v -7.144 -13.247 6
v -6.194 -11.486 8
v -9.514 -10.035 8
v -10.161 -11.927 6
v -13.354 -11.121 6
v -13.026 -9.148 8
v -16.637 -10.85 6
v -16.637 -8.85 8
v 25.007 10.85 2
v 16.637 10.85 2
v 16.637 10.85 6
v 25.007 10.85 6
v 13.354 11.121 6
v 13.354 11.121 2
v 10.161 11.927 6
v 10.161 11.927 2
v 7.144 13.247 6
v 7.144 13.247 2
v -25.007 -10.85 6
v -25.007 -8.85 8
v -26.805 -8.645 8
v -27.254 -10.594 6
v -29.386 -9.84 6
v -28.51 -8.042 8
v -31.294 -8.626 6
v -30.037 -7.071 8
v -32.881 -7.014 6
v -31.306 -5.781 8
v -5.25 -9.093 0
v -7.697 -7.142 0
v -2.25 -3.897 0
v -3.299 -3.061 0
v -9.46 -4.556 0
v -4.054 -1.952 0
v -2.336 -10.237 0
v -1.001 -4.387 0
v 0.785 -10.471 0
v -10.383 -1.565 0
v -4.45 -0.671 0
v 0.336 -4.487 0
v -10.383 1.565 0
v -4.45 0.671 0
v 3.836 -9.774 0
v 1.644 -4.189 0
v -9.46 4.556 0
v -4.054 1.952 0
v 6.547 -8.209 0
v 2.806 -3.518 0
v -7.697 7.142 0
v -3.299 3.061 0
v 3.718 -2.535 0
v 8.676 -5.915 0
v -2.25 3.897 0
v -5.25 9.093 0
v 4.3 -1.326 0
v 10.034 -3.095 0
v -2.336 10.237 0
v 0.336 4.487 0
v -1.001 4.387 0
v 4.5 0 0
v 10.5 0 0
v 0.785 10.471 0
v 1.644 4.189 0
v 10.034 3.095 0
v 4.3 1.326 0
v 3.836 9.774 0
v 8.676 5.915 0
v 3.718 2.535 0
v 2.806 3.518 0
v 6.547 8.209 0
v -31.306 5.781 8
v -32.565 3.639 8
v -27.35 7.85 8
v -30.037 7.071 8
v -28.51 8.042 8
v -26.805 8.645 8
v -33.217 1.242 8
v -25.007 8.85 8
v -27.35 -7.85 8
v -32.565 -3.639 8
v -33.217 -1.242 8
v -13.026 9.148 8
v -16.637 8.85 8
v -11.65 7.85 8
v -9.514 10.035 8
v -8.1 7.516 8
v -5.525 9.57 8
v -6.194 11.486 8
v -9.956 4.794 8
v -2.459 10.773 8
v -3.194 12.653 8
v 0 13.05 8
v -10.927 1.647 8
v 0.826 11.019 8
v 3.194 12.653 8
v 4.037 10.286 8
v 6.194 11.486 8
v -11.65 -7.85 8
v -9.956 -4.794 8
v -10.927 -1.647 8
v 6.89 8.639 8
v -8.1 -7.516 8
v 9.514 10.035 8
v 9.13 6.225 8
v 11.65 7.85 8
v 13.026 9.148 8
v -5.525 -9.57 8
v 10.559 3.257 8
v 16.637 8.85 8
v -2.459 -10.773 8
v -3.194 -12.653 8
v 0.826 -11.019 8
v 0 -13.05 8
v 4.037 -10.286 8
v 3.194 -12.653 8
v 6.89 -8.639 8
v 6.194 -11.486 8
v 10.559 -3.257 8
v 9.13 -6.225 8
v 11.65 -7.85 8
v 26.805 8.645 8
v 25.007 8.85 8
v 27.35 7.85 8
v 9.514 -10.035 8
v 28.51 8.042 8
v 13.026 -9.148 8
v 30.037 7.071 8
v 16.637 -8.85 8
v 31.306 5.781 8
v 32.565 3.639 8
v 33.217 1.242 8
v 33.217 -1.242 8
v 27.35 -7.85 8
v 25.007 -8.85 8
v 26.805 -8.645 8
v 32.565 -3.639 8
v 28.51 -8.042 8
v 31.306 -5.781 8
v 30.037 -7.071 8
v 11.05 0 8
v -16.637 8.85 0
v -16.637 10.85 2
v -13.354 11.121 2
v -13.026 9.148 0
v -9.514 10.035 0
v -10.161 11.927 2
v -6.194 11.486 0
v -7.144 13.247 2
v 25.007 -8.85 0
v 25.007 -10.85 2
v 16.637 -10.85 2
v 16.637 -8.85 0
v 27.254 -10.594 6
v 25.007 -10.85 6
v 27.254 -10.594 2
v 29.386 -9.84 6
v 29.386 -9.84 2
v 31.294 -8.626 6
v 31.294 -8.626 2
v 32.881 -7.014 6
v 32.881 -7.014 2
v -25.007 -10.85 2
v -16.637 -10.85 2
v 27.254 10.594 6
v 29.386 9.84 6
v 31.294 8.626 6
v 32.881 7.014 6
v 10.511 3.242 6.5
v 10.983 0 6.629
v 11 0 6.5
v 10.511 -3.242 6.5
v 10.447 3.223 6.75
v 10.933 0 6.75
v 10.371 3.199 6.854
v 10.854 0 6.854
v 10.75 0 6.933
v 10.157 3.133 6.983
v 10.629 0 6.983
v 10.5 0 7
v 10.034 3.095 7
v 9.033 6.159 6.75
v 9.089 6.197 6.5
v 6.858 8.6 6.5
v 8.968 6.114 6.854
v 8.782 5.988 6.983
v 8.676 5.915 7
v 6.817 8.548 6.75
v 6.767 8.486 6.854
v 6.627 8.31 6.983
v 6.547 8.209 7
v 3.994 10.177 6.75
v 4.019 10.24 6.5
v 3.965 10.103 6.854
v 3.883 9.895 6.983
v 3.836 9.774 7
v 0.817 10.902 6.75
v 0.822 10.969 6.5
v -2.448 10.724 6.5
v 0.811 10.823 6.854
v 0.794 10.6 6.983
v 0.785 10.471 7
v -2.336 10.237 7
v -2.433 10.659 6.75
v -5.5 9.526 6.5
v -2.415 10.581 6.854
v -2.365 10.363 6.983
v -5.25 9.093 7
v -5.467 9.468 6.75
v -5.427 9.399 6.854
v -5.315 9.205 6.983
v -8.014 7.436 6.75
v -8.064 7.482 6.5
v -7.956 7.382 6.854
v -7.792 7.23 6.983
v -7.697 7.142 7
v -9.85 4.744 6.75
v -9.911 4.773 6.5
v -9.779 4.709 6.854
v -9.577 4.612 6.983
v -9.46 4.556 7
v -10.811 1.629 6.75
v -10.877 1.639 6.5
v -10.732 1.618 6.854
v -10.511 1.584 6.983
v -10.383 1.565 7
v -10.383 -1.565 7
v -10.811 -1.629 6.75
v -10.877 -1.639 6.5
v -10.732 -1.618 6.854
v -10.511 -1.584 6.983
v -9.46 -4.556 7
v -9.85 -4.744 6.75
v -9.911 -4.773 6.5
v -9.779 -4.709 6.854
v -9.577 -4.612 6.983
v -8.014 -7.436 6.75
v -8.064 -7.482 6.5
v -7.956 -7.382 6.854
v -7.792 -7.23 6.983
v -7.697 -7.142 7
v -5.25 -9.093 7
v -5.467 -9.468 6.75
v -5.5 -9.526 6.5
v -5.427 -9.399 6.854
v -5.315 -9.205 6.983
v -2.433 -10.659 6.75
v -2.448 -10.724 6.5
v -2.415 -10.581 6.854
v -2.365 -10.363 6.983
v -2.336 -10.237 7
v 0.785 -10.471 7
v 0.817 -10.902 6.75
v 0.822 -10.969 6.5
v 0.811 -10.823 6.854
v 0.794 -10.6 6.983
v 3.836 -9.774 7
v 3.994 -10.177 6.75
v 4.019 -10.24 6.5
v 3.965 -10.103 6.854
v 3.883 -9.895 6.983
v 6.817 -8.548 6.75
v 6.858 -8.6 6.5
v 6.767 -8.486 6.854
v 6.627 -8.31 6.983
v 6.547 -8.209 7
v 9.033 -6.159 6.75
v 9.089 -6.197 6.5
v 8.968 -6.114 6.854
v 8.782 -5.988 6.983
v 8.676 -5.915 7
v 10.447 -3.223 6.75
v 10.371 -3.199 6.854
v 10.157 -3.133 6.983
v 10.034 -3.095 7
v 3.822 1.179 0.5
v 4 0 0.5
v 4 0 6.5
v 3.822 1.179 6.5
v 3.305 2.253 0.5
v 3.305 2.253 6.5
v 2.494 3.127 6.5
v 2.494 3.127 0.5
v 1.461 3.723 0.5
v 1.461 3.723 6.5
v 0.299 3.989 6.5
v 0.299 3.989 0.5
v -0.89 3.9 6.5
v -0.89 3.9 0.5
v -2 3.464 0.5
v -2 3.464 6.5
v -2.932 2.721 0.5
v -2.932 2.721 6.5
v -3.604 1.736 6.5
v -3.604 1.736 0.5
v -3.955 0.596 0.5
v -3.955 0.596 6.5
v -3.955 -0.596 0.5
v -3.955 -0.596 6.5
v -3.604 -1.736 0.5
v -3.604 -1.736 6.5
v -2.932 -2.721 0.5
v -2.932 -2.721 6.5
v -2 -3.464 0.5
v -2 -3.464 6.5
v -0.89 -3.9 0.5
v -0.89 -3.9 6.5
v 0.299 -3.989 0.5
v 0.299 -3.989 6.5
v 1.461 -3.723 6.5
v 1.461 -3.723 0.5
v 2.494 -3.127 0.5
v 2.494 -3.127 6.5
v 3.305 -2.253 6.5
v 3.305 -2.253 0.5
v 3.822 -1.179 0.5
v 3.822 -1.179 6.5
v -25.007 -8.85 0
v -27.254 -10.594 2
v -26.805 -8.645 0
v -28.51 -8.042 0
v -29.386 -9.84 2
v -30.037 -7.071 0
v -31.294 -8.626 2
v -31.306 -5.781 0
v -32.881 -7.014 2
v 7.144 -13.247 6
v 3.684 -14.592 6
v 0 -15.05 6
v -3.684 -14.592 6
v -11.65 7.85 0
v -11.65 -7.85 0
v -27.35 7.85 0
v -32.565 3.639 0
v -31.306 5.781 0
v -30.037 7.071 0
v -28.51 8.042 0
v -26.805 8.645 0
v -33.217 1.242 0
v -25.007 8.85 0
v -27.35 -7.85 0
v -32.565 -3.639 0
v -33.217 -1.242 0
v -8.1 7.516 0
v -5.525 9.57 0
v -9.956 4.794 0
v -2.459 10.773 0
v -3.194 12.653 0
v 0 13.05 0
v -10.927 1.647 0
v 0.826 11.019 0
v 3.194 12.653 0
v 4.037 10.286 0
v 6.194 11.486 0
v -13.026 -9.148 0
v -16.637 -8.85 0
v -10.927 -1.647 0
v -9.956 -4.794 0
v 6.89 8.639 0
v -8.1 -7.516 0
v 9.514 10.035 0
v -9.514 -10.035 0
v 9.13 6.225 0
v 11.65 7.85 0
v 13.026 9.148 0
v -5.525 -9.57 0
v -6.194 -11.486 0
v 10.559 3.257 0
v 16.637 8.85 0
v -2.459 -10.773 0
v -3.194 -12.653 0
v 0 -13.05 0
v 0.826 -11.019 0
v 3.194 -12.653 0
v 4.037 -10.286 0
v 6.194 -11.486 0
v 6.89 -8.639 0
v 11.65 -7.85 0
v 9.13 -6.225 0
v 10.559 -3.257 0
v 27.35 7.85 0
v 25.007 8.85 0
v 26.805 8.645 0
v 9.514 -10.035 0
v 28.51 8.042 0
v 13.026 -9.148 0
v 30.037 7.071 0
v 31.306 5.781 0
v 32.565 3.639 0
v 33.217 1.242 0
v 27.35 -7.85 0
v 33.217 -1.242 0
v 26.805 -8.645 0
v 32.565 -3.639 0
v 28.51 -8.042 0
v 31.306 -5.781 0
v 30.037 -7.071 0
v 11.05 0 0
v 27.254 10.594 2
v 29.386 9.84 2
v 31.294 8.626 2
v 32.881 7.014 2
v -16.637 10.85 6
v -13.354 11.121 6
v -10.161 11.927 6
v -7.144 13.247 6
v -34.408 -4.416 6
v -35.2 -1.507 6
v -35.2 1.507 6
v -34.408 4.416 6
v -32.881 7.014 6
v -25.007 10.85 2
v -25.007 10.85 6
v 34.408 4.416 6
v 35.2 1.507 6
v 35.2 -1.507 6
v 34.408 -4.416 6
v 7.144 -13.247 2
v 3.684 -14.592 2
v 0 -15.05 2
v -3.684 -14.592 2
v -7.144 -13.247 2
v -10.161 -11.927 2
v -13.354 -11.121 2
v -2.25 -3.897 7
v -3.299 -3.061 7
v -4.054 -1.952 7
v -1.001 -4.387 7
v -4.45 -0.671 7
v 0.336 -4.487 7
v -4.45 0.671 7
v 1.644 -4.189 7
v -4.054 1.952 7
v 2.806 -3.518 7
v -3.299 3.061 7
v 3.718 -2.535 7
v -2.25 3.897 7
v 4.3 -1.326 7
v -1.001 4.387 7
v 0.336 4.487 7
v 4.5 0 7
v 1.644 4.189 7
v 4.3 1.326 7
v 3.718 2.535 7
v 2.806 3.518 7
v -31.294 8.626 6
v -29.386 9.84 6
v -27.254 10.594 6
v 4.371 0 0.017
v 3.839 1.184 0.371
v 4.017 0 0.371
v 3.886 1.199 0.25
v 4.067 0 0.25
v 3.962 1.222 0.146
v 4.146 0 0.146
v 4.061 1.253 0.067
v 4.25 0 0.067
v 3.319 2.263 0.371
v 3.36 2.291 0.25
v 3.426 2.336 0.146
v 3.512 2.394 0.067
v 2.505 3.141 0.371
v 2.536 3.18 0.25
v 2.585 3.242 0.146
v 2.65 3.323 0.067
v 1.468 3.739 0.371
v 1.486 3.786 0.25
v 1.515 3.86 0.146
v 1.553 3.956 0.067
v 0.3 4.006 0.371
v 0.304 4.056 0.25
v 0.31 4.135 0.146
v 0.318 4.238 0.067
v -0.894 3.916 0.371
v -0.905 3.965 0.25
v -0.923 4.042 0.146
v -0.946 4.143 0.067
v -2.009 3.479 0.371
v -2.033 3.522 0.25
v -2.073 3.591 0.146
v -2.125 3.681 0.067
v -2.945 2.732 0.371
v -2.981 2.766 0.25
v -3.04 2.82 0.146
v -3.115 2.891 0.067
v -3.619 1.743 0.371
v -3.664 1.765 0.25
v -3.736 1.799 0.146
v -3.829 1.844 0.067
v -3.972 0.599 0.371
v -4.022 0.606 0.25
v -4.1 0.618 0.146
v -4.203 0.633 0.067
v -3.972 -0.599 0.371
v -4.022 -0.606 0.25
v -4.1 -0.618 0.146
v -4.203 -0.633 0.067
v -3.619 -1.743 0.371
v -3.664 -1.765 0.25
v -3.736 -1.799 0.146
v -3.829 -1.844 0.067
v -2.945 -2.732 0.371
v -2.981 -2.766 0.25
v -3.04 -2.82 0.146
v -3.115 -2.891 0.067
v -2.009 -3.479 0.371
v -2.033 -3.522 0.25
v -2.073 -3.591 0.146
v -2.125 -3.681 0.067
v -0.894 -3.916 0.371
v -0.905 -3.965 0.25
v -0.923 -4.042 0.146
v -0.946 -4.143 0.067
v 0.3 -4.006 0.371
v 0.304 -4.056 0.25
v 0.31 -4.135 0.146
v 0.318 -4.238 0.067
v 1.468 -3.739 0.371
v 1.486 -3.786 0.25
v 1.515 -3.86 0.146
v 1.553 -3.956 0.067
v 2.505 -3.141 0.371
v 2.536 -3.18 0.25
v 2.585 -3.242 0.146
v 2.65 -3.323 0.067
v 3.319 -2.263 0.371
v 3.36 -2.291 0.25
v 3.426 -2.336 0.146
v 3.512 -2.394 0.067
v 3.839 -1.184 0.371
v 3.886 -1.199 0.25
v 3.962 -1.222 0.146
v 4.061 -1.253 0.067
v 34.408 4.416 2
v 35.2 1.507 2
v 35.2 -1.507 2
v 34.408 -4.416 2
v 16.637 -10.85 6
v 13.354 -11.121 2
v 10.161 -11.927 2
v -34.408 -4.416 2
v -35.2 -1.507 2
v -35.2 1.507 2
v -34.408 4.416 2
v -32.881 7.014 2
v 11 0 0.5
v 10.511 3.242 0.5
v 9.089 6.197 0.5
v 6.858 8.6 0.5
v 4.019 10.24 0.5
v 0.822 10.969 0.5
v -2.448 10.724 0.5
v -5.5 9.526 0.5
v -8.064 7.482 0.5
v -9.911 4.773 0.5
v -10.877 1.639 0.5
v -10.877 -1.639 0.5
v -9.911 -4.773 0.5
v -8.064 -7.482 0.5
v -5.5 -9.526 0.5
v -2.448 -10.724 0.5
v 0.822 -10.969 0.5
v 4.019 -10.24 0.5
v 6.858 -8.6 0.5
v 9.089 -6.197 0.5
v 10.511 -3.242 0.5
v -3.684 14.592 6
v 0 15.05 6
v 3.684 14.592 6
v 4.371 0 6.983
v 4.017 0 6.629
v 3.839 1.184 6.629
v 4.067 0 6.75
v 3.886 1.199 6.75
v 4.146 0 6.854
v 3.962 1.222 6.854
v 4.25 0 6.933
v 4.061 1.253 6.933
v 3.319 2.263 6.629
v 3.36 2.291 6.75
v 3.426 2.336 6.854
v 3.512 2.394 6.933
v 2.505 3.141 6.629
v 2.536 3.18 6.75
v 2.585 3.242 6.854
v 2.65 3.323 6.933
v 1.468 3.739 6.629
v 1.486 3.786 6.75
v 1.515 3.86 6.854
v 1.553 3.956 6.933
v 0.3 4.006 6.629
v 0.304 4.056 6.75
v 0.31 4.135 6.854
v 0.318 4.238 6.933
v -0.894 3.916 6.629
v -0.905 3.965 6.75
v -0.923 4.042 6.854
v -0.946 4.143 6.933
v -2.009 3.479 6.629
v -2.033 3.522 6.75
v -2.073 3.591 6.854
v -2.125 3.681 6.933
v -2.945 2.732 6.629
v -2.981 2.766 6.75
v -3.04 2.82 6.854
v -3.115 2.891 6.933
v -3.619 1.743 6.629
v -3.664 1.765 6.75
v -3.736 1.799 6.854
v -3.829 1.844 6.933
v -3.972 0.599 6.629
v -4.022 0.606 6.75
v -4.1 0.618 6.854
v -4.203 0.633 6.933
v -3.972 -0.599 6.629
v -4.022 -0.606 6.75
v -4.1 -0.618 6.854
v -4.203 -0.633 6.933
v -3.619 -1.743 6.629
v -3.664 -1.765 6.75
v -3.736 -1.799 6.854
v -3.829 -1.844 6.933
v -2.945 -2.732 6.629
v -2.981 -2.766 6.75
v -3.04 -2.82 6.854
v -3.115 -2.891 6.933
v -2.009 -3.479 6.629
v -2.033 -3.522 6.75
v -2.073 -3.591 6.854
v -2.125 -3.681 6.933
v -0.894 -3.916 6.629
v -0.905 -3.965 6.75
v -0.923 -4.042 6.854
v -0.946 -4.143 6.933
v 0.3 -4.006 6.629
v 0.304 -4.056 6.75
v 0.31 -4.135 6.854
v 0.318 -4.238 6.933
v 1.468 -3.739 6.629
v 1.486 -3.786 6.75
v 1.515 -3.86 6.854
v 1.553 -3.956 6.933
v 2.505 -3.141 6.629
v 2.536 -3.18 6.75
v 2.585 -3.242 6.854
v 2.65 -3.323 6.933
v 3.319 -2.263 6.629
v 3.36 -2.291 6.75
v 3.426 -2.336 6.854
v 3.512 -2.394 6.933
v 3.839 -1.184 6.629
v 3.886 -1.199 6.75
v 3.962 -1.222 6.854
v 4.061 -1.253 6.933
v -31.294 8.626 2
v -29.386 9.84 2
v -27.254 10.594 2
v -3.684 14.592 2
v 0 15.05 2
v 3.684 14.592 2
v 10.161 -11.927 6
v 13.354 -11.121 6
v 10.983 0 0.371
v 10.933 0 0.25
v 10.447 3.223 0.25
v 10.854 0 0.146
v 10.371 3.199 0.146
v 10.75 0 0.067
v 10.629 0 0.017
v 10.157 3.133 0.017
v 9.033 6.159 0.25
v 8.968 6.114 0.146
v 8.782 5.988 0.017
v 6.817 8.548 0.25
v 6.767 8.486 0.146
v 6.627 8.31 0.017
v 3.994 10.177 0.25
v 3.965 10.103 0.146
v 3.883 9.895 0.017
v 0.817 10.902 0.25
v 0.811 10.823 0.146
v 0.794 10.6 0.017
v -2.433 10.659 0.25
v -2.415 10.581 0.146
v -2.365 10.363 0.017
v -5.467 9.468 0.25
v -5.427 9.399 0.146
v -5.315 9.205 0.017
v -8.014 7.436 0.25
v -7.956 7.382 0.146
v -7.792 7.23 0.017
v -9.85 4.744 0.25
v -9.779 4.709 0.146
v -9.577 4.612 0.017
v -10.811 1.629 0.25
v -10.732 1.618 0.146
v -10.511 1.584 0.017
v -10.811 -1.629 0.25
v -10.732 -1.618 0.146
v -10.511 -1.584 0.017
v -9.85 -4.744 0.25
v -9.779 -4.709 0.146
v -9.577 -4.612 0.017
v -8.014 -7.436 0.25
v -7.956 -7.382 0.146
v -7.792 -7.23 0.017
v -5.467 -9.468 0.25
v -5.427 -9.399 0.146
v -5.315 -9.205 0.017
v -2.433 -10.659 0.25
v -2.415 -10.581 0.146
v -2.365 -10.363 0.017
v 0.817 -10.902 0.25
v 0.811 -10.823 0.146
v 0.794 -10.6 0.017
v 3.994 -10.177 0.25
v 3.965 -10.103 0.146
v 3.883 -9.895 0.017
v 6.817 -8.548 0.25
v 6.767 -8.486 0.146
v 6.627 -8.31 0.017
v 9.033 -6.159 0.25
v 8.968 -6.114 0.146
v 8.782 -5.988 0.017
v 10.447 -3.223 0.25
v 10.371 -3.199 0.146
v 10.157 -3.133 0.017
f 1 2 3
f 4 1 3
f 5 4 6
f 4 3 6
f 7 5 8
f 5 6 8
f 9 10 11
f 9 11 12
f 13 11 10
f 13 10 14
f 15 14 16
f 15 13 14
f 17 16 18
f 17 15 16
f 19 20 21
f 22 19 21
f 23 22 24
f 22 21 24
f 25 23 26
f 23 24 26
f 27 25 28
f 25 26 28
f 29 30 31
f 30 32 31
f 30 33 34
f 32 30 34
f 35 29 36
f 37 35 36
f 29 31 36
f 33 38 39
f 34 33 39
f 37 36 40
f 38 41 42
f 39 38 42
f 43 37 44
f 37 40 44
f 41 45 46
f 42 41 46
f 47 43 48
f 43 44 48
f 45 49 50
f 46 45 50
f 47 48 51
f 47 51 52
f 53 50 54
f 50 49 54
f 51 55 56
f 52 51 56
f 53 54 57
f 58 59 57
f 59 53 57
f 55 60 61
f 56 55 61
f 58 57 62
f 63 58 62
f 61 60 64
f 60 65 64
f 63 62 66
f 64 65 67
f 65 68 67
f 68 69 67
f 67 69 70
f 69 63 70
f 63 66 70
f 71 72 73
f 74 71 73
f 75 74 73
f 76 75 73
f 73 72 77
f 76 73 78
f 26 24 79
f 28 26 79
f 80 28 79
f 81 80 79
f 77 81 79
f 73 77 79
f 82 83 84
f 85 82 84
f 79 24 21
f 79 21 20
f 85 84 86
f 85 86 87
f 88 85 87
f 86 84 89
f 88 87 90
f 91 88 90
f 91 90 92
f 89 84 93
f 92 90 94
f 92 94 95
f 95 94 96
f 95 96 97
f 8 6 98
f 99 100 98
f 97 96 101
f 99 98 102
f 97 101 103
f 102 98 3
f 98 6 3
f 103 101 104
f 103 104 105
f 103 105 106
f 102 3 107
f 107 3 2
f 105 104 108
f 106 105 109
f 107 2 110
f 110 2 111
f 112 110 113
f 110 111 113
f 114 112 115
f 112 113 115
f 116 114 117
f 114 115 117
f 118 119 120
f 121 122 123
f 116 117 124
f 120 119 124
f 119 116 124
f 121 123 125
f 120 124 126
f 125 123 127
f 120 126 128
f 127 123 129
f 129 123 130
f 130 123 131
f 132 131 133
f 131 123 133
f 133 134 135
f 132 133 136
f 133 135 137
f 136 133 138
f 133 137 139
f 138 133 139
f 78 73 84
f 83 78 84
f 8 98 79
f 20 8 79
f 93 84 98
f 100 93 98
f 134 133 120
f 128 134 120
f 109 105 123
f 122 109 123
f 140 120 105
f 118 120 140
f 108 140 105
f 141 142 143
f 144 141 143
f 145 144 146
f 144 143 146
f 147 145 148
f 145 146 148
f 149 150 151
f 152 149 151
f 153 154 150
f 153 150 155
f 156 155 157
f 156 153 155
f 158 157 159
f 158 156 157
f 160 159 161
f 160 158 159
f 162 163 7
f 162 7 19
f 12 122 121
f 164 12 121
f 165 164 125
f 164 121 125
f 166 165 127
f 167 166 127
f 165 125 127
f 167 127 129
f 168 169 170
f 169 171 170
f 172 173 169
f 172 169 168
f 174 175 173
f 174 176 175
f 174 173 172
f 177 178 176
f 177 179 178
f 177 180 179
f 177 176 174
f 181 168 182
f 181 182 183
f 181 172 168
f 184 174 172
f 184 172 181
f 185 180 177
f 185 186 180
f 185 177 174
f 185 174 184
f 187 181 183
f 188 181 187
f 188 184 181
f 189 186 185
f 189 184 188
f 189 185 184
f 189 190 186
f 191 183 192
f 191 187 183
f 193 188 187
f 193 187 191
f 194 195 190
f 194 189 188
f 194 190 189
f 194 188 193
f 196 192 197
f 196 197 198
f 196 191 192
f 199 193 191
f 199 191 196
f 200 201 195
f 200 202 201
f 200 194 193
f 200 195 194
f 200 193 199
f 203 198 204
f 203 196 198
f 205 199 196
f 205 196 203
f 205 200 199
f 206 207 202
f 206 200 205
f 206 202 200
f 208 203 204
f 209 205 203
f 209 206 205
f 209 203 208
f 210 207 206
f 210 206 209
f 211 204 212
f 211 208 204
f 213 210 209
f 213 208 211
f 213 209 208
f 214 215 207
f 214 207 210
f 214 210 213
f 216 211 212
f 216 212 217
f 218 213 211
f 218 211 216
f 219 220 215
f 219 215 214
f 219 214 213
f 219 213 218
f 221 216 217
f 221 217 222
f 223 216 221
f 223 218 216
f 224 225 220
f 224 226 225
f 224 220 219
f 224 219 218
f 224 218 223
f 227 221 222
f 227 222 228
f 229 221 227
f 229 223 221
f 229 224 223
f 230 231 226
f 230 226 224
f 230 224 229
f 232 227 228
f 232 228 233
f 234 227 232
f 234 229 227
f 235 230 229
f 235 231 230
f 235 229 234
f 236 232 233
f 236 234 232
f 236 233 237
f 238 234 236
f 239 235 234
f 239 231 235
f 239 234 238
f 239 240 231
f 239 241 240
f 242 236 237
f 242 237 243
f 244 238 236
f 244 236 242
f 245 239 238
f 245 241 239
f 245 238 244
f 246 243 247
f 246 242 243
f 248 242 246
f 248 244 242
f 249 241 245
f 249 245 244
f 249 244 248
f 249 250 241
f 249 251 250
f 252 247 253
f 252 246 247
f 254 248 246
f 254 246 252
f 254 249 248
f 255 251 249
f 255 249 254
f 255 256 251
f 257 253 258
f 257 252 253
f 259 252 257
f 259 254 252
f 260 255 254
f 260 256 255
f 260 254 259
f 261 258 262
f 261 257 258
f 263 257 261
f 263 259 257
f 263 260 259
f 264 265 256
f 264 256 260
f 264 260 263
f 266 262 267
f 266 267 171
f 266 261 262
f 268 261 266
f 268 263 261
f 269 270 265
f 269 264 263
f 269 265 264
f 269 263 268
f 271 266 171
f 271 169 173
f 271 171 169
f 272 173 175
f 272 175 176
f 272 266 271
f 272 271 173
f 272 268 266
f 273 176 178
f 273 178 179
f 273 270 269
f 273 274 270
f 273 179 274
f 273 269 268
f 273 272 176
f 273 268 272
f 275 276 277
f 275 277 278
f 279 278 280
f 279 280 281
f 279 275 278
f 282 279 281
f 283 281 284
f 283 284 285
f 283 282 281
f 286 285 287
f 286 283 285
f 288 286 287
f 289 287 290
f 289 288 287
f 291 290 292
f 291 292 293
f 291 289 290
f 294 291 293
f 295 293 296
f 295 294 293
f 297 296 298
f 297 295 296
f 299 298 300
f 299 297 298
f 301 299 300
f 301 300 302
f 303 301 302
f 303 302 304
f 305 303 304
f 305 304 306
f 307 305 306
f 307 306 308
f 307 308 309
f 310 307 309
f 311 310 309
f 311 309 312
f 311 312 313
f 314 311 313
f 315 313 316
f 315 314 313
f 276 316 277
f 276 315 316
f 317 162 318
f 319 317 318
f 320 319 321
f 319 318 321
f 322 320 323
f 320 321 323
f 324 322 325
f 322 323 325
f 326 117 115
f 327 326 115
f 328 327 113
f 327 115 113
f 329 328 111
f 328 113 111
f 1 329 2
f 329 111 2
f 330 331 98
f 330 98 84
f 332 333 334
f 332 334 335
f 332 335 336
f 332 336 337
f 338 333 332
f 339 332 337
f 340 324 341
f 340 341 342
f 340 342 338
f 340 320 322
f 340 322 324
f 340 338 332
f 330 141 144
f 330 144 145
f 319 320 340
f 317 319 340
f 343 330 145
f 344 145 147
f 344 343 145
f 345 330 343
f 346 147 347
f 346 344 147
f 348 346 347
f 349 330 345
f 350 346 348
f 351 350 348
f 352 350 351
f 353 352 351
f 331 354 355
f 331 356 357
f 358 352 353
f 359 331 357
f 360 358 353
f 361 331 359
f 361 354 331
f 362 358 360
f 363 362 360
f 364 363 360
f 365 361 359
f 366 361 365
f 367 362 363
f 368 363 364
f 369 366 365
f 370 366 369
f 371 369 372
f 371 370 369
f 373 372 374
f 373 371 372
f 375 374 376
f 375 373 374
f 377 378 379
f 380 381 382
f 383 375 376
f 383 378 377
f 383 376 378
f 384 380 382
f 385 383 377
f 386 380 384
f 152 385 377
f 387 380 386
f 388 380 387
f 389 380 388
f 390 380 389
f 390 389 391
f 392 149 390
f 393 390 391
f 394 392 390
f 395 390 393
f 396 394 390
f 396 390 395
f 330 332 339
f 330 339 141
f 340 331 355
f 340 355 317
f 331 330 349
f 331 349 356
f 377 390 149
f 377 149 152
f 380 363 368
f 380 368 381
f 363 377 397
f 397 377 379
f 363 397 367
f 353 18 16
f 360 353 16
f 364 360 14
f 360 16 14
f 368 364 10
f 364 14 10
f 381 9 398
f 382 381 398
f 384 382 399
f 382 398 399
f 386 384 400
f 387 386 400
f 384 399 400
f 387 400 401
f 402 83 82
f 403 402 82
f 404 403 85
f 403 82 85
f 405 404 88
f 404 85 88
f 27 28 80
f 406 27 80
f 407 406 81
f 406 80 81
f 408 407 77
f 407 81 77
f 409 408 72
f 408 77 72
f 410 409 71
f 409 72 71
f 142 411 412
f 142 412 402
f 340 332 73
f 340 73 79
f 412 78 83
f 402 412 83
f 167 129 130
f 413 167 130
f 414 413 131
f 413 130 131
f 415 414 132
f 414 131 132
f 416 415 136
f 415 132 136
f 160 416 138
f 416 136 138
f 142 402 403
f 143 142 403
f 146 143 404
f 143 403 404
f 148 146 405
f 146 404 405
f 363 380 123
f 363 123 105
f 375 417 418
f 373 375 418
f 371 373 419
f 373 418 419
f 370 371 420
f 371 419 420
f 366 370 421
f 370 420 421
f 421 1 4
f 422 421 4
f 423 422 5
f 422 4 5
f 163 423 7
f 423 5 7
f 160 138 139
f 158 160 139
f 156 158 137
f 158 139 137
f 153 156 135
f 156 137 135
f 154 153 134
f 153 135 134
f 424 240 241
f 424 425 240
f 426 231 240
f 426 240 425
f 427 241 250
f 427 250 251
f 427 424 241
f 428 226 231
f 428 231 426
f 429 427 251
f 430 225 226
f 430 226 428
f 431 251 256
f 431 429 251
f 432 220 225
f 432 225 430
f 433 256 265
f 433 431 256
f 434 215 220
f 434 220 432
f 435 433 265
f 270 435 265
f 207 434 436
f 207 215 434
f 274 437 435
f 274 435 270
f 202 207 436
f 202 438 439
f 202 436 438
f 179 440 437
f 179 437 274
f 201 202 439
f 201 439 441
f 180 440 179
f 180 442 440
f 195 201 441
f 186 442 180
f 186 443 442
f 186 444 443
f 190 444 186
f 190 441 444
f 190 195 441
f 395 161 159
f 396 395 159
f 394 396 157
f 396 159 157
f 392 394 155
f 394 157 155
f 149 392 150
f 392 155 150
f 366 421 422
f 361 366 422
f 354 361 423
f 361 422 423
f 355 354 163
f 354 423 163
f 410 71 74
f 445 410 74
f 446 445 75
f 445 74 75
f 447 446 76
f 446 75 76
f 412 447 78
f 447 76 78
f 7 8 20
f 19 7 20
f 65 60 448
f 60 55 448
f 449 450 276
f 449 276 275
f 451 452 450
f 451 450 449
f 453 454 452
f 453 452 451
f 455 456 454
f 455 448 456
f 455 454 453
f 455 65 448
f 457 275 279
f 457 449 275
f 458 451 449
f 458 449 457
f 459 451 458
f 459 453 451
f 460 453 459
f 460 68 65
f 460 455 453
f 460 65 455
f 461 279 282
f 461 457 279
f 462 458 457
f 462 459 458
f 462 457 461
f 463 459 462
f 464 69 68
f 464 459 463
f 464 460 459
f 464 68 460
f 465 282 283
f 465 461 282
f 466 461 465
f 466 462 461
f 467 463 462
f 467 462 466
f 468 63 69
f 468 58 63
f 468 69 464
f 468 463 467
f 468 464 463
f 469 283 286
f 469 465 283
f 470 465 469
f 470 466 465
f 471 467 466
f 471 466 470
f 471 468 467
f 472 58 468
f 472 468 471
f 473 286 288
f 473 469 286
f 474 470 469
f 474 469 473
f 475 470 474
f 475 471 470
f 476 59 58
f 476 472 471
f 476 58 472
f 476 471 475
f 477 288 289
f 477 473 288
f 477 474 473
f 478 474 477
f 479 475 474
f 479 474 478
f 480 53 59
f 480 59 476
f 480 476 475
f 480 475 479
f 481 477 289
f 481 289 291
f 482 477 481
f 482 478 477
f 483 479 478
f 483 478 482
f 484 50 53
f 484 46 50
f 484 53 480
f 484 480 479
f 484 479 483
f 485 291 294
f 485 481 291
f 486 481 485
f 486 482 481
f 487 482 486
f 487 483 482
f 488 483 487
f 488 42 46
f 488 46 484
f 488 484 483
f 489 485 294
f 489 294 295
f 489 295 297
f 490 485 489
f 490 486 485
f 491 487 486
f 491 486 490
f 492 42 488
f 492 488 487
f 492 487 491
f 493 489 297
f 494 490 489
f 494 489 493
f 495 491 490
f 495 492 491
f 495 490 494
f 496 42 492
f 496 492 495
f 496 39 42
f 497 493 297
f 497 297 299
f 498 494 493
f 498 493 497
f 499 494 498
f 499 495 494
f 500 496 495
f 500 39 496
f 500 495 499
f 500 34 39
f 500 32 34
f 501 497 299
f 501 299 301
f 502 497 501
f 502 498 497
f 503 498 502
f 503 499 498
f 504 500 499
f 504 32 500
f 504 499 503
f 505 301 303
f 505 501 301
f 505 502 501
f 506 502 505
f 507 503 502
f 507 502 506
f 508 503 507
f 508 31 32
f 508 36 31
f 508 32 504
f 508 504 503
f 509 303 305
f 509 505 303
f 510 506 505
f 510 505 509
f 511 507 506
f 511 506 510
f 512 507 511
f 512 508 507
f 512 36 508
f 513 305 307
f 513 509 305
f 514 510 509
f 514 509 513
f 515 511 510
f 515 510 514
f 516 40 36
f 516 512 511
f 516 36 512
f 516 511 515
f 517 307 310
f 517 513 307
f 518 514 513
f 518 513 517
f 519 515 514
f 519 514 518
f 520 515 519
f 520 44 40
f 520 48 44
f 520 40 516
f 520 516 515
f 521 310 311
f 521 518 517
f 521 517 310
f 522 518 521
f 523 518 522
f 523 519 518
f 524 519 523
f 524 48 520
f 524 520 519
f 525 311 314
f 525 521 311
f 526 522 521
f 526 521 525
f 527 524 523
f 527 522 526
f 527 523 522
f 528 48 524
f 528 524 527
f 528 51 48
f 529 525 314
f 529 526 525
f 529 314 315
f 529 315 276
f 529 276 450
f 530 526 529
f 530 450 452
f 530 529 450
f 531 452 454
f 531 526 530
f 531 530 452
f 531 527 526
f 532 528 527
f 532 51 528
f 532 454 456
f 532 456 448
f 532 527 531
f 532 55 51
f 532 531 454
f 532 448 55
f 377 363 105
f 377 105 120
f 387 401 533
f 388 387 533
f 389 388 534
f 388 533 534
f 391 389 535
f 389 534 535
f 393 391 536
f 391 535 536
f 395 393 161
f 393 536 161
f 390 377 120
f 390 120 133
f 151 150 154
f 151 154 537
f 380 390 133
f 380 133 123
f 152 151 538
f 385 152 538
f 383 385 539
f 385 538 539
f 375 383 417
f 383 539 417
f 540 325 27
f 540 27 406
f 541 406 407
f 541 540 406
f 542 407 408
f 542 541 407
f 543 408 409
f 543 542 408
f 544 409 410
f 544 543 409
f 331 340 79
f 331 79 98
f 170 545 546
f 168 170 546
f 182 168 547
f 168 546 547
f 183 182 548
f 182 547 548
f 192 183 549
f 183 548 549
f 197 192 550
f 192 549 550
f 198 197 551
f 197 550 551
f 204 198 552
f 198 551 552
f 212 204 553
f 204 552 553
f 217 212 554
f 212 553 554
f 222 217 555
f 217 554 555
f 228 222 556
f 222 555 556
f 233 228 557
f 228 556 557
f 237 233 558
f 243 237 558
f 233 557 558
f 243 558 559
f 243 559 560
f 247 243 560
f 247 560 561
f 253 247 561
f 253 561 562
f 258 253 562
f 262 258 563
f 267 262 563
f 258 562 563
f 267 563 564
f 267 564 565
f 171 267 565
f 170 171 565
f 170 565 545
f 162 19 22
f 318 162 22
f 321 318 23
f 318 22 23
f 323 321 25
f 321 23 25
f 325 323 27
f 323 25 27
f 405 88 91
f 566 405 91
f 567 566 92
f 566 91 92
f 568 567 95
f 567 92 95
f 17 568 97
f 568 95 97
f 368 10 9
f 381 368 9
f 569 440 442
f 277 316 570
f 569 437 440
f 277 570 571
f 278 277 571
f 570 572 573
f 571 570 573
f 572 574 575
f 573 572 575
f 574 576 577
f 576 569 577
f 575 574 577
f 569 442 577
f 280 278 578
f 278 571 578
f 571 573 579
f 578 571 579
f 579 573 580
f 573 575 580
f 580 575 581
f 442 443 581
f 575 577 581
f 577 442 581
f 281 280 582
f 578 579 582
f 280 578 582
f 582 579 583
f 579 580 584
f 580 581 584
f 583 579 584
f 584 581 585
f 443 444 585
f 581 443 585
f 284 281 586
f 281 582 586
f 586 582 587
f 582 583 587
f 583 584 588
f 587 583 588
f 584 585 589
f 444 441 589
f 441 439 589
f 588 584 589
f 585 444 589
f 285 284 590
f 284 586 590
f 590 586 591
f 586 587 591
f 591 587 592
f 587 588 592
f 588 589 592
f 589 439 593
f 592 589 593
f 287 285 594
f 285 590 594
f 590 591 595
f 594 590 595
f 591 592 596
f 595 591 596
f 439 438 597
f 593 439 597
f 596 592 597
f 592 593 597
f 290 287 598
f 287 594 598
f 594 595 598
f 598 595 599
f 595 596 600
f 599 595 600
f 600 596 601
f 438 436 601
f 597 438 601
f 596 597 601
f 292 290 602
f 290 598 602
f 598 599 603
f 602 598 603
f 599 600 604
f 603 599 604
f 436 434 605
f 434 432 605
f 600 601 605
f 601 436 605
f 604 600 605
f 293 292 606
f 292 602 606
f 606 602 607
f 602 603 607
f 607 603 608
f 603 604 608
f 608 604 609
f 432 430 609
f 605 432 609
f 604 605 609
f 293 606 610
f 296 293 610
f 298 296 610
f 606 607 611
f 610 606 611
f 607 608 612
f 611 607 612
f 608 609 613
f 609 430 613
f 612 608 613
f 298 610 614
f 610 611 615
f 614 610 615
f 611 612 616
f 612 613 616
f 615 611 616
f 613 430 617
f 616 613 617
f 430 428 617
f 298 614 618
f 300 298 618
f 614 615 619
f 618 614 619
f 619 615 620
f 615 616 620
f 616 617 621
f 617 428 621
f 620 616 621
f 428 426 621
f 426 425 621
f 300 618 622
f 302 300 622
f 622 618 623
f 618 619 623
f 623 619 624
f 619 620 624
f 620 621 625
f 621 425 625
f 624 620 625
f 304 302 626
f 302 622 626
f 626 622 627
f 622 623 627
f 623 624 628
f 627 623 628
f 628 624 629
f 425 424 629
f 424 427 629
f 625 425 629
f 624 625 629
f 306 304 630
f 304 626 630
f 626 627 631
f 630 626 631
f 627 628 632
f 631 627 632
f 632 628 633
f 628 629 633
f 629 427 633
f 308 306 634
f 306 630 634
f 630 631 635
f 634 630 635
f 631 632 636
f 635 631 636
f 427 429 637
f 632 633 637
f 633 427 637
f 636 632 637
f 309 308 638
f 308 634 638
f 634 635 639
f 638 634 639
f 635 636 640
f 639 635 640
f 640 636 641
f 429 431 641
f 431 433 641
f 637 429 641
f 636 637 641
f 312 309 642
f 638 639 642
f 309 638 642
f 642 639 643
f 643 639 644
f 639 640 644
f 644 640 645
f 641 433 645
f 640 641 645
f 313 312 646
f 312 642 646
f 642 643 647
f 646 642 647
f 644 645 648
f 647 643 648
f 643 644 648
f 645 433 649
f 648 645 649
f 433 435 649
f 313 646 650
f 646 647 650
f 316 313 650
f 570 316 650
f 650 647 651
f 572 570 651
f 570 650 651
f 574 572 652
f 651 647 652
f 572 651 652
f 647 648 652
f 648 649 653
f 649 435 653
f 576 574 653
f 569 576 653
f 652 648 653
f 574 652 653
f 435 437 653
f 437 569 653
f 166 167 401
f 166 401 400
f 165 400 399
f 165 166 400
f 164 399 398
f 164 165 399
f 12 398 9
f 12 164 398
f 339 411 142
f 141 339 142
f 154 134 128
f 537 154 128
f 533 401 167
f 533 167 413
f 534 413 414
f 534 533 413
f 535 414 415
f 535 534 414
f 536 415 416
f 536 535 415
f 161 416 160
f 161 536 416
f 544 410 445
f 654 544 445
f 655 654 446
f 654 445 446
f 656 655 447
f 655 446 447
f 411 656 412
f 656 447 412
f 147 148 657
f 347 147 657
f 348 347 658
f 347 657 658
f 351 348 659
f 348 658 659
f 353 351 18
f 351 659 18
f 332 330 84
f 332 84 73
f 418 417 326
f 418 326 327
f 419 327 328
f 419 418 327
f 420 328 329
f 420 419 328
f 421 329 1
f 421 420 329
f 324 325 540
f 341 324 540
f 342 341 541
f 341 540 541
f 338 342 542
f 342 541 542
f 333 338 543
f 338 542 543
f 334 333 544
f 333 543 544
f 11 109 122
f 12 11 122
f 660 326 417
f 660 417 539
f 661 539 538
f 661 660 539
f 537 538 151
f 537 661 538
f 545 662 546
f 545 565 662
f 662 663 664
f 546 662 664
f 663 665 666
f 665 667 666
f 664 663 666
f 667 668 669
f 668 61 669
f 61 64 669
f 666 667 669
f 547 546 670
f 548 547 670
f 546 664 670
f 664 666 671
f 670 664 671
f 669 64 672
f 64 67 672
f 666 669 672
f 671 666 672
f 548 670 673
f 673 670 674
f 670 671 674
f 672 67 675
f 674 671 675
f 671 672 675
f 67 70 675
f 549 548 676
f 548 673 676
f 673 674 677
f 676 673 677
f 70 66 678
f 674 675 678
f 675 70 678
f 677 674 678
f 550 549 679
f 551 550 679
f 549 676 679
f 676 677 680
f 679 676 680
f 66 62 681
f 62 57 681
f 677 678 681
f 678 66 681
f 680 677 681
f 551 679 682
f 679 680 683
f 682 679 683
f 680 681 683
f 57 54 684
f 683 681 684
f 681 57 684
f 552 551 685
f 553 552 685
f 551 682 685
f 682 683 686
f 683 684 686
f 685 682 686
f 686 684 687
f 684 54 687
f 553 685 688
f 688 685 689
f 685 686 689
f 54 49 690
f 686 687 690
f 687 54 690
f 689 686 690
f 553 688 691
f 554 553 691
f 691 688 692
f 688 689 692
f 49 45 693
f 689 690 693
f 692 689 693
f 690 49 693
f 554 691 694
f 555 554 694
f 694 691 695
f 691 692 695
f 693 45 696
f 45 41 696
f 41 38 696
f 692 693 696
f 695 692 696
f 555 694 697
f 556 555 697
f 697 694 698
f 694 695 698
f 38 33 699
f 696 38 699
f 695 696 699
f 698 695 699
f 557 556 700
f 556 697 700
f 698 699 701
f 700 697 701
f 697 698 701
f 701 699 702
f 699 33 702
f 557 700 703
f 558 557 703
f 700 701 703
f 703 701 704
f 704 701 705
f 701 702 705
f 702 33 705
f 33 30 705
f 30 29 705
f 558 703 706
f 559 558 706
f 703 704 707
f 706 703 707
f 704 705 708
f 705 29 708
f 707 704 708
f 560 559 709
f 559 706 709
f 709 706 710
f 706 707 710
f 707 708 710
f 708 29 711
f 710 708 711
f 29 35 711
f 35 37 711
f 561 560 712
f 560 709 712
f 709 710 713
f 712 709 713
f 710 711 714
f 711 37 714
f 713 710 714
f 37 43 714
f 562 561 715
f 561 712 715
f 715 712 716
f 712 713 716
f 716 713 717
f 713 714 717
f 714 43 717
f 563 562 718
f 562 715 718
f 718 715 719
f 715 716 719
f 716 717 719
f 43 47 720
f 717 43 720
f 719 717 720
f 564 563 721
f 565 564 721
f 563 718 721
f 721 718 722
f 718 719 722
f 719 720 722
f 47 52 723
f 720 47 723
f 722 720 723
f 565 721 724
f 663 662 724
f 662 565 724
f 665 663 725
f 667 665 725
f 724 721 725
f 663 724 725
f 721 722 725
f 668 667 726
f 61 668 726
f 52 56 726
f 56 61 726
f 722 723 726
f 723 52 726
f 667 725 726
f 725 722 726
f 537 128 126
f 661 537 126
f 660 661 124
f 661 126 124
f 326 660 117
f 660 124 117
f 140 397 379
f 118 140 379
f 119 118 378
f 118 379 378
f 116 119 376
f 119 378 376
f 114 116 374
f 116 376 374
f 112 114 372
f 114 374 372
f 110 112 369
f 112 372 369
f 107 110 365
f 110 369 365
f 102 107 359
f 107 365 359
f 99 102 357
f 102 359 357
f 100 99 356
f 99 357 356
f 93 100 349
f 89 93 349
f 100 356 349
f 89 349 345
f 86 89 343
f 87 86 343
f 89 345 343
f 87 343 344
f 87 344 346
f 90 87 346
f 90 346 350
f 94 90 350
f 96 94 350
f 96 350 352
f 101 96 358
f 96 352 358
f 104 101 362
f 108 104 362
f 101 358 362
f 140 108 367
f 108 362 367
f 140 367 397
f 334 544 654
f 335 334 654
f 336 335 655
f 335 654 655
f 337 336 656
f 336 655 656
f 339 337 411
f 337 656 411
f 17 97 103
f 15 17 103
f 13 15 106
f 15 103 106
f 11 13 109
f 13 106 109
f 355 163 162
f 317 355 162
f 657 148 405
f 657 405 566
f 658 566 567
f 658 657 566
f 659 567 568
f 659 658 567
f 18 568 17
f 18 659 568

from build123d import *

# Parameters (mm, degrees)
F0_R     = 11
F0_R_2   = 4
F1_DEPTH = 7
F3_R     = 0.5
F2_R     = 11.05
F4_DEPTH = 8
F5_R     = 20
F6_R     = 10
F7_SIZE  = 2


# Not quite as in the source:
# - a feature names something its author has since deleted; it is built from what else it names


with BuildPart() as f1:
    # F0 (on Top) → F1 (new body)
    with BuildSketch(Plane.XY):
        Circle(F0_R)
        Circle(F0_R_2, mode=Mode.SUBTRACT)
    extrude(amount=F1_DEPTH)

    # F3
    f3_edges = [f1.edges().sort_by_distance(p)[0] for p in [
        (-11, 0, 0),
        (-4, 0, 0),
        (-11, 0, 7),
        (-4, 0, 7),
    ]]
    fillet(f3_edges, radius=F3_R)


with BuildPart() as f4:
    # F2 (on face) → F4 (new body)
    with BuildSketch(Plane(origin=(0, 0, 0), x_dir=(1, 0, 0), z_dir=(0, 0, -1))):
        with BuildLine():
            ThreePointArc((12.8405607354, 7.85), (11.731454134, 9.4273794822), (10.429765098, 10.85))
            ThreePointArc((10.429765098, 10.85), (0, 15.05), (-10.429765098, 10.85))
            ThreePointArc((-10.429765098, 10.85), (-11.731454134, 9.4273794822), (-12.8405607354, 7.85))
            Line((-12.8405607354, 7.85), (-11.65, 7.85))
            Line((-11.65, 7.85), (-11.65, -7.85))
            Line((-11.65, -7.85), (-12.8405607354, -7.85))
            ThreePointArc((-12.8405607354, -7.85), (-11.731454134, -9.4273794822), (-10.429765098, -10.85))
            ThreePointArc((-10.429765098, -10.85), (0, -15.05), (10.429765098, -10.85))
            ThreePointArc((10.429765098, -10.85), (11.731454134, -9.4273794822), (12.8405607354, -7.85))
            Line((12.8405607354, -7.85), (11.65, -7.85))
            Line((11.65, -7.85), (11.65, 7.85))
            Line((11.65, 7.85), (12.8405607354, 7.85))
        make_face()
        Circle(F2_R, mode=Mode.SUBTRACT)
        with BuildLine():
            Line((23, 10.85), (10.429765098, 10.85))
            ThreePointArc((10.429765098, 10.85), (11.731454134, 9.4273794822), (12.8405607354, 7.85))
            Line((12.8405607354, 7.85), (27.35, 7.85))
            Line((27.35, 7.85), (27.35, -7.85))
            Line((27.35, -7.85), (12.8405607354, -7.85))
            ThreePointArc((12.8405607354, -7.85), (11.731454134, -9.4273794822), (10.429765098, -10.85))
            Line((10.429765098, -10.85), (23, -10.85))
            Line((23, -10.85), (27.35, -10.85))
            ThreePointArc((27.35, -10.85), (35.3, 0), (27.35, 10.85))
            Line((27.35, 10.85), (23, 10.85))
        make_face()
        with BuildLine():
            ThreePointArc((-12.8405607354, 7.85), (-11.731454134, 9.4273794822), (-10.429765098, 10.85))
            Line((-10.429765098, 10.85), (-23, 10.85))
            Line((-23, 10.85), (-27.35, 10.85))
            ThreePointArc((-27.35, 10.85), (-35.3, 0), (-27.35, -10.85))
            Line((-27.35, -10.85), (-23, -10.85))
            Line((-23, -10.85), (-10.429765098, -10.85))
            ThreePointArc((-10.429765098, -10.85), (-11.731454134, -9.4273794822), (-12.8405607354, -7.85))
            Line((-12.8405607354, -7.85), (-27.35, -7.85))
            Line((-27.35, -7.85), (-27.35, 7.85))
            Line((-27.35, 7.85), (-12.8405607354, 7.85))
        make_face()
    extrude(amount=-F4_DEPTH)

    # F5
    f5_edges = [f4.edges().sort_by_distance(p)[0] for p in [
        (10.429765, -10.85, 4),
        (10.429765, 10.85, 4),
        (-10.429765, 10.85, 4),
        (-10.429765, -10.85, 4),
    ]]
    fillet(f5_edges, radius=F5_R)

    # F6
    f6_edges = [f4.edges().sort_by_distance(p)[0] for p in [
        (-27.35, -10.85, 4),
        (-27.35, 10.85, 4),
        (27.35, 10.85, 4),
        (27.35, -10.85, 4),
    ]]
    fillet(f6_edges, radius=F6_R)

    # F7
    f7_edges = [f4.edges().sort_by_distance(p)[0] for p in [
        (35.3, 0, 8),
        (-29.38625, -9.840049, 8),
        (-35.3, 0, 0),
        (35.3, 0, 0),
    ]]
    chamfer(f7_edges, length=F7_SIZE)


solid = Compound([f1.part, f4.part])
